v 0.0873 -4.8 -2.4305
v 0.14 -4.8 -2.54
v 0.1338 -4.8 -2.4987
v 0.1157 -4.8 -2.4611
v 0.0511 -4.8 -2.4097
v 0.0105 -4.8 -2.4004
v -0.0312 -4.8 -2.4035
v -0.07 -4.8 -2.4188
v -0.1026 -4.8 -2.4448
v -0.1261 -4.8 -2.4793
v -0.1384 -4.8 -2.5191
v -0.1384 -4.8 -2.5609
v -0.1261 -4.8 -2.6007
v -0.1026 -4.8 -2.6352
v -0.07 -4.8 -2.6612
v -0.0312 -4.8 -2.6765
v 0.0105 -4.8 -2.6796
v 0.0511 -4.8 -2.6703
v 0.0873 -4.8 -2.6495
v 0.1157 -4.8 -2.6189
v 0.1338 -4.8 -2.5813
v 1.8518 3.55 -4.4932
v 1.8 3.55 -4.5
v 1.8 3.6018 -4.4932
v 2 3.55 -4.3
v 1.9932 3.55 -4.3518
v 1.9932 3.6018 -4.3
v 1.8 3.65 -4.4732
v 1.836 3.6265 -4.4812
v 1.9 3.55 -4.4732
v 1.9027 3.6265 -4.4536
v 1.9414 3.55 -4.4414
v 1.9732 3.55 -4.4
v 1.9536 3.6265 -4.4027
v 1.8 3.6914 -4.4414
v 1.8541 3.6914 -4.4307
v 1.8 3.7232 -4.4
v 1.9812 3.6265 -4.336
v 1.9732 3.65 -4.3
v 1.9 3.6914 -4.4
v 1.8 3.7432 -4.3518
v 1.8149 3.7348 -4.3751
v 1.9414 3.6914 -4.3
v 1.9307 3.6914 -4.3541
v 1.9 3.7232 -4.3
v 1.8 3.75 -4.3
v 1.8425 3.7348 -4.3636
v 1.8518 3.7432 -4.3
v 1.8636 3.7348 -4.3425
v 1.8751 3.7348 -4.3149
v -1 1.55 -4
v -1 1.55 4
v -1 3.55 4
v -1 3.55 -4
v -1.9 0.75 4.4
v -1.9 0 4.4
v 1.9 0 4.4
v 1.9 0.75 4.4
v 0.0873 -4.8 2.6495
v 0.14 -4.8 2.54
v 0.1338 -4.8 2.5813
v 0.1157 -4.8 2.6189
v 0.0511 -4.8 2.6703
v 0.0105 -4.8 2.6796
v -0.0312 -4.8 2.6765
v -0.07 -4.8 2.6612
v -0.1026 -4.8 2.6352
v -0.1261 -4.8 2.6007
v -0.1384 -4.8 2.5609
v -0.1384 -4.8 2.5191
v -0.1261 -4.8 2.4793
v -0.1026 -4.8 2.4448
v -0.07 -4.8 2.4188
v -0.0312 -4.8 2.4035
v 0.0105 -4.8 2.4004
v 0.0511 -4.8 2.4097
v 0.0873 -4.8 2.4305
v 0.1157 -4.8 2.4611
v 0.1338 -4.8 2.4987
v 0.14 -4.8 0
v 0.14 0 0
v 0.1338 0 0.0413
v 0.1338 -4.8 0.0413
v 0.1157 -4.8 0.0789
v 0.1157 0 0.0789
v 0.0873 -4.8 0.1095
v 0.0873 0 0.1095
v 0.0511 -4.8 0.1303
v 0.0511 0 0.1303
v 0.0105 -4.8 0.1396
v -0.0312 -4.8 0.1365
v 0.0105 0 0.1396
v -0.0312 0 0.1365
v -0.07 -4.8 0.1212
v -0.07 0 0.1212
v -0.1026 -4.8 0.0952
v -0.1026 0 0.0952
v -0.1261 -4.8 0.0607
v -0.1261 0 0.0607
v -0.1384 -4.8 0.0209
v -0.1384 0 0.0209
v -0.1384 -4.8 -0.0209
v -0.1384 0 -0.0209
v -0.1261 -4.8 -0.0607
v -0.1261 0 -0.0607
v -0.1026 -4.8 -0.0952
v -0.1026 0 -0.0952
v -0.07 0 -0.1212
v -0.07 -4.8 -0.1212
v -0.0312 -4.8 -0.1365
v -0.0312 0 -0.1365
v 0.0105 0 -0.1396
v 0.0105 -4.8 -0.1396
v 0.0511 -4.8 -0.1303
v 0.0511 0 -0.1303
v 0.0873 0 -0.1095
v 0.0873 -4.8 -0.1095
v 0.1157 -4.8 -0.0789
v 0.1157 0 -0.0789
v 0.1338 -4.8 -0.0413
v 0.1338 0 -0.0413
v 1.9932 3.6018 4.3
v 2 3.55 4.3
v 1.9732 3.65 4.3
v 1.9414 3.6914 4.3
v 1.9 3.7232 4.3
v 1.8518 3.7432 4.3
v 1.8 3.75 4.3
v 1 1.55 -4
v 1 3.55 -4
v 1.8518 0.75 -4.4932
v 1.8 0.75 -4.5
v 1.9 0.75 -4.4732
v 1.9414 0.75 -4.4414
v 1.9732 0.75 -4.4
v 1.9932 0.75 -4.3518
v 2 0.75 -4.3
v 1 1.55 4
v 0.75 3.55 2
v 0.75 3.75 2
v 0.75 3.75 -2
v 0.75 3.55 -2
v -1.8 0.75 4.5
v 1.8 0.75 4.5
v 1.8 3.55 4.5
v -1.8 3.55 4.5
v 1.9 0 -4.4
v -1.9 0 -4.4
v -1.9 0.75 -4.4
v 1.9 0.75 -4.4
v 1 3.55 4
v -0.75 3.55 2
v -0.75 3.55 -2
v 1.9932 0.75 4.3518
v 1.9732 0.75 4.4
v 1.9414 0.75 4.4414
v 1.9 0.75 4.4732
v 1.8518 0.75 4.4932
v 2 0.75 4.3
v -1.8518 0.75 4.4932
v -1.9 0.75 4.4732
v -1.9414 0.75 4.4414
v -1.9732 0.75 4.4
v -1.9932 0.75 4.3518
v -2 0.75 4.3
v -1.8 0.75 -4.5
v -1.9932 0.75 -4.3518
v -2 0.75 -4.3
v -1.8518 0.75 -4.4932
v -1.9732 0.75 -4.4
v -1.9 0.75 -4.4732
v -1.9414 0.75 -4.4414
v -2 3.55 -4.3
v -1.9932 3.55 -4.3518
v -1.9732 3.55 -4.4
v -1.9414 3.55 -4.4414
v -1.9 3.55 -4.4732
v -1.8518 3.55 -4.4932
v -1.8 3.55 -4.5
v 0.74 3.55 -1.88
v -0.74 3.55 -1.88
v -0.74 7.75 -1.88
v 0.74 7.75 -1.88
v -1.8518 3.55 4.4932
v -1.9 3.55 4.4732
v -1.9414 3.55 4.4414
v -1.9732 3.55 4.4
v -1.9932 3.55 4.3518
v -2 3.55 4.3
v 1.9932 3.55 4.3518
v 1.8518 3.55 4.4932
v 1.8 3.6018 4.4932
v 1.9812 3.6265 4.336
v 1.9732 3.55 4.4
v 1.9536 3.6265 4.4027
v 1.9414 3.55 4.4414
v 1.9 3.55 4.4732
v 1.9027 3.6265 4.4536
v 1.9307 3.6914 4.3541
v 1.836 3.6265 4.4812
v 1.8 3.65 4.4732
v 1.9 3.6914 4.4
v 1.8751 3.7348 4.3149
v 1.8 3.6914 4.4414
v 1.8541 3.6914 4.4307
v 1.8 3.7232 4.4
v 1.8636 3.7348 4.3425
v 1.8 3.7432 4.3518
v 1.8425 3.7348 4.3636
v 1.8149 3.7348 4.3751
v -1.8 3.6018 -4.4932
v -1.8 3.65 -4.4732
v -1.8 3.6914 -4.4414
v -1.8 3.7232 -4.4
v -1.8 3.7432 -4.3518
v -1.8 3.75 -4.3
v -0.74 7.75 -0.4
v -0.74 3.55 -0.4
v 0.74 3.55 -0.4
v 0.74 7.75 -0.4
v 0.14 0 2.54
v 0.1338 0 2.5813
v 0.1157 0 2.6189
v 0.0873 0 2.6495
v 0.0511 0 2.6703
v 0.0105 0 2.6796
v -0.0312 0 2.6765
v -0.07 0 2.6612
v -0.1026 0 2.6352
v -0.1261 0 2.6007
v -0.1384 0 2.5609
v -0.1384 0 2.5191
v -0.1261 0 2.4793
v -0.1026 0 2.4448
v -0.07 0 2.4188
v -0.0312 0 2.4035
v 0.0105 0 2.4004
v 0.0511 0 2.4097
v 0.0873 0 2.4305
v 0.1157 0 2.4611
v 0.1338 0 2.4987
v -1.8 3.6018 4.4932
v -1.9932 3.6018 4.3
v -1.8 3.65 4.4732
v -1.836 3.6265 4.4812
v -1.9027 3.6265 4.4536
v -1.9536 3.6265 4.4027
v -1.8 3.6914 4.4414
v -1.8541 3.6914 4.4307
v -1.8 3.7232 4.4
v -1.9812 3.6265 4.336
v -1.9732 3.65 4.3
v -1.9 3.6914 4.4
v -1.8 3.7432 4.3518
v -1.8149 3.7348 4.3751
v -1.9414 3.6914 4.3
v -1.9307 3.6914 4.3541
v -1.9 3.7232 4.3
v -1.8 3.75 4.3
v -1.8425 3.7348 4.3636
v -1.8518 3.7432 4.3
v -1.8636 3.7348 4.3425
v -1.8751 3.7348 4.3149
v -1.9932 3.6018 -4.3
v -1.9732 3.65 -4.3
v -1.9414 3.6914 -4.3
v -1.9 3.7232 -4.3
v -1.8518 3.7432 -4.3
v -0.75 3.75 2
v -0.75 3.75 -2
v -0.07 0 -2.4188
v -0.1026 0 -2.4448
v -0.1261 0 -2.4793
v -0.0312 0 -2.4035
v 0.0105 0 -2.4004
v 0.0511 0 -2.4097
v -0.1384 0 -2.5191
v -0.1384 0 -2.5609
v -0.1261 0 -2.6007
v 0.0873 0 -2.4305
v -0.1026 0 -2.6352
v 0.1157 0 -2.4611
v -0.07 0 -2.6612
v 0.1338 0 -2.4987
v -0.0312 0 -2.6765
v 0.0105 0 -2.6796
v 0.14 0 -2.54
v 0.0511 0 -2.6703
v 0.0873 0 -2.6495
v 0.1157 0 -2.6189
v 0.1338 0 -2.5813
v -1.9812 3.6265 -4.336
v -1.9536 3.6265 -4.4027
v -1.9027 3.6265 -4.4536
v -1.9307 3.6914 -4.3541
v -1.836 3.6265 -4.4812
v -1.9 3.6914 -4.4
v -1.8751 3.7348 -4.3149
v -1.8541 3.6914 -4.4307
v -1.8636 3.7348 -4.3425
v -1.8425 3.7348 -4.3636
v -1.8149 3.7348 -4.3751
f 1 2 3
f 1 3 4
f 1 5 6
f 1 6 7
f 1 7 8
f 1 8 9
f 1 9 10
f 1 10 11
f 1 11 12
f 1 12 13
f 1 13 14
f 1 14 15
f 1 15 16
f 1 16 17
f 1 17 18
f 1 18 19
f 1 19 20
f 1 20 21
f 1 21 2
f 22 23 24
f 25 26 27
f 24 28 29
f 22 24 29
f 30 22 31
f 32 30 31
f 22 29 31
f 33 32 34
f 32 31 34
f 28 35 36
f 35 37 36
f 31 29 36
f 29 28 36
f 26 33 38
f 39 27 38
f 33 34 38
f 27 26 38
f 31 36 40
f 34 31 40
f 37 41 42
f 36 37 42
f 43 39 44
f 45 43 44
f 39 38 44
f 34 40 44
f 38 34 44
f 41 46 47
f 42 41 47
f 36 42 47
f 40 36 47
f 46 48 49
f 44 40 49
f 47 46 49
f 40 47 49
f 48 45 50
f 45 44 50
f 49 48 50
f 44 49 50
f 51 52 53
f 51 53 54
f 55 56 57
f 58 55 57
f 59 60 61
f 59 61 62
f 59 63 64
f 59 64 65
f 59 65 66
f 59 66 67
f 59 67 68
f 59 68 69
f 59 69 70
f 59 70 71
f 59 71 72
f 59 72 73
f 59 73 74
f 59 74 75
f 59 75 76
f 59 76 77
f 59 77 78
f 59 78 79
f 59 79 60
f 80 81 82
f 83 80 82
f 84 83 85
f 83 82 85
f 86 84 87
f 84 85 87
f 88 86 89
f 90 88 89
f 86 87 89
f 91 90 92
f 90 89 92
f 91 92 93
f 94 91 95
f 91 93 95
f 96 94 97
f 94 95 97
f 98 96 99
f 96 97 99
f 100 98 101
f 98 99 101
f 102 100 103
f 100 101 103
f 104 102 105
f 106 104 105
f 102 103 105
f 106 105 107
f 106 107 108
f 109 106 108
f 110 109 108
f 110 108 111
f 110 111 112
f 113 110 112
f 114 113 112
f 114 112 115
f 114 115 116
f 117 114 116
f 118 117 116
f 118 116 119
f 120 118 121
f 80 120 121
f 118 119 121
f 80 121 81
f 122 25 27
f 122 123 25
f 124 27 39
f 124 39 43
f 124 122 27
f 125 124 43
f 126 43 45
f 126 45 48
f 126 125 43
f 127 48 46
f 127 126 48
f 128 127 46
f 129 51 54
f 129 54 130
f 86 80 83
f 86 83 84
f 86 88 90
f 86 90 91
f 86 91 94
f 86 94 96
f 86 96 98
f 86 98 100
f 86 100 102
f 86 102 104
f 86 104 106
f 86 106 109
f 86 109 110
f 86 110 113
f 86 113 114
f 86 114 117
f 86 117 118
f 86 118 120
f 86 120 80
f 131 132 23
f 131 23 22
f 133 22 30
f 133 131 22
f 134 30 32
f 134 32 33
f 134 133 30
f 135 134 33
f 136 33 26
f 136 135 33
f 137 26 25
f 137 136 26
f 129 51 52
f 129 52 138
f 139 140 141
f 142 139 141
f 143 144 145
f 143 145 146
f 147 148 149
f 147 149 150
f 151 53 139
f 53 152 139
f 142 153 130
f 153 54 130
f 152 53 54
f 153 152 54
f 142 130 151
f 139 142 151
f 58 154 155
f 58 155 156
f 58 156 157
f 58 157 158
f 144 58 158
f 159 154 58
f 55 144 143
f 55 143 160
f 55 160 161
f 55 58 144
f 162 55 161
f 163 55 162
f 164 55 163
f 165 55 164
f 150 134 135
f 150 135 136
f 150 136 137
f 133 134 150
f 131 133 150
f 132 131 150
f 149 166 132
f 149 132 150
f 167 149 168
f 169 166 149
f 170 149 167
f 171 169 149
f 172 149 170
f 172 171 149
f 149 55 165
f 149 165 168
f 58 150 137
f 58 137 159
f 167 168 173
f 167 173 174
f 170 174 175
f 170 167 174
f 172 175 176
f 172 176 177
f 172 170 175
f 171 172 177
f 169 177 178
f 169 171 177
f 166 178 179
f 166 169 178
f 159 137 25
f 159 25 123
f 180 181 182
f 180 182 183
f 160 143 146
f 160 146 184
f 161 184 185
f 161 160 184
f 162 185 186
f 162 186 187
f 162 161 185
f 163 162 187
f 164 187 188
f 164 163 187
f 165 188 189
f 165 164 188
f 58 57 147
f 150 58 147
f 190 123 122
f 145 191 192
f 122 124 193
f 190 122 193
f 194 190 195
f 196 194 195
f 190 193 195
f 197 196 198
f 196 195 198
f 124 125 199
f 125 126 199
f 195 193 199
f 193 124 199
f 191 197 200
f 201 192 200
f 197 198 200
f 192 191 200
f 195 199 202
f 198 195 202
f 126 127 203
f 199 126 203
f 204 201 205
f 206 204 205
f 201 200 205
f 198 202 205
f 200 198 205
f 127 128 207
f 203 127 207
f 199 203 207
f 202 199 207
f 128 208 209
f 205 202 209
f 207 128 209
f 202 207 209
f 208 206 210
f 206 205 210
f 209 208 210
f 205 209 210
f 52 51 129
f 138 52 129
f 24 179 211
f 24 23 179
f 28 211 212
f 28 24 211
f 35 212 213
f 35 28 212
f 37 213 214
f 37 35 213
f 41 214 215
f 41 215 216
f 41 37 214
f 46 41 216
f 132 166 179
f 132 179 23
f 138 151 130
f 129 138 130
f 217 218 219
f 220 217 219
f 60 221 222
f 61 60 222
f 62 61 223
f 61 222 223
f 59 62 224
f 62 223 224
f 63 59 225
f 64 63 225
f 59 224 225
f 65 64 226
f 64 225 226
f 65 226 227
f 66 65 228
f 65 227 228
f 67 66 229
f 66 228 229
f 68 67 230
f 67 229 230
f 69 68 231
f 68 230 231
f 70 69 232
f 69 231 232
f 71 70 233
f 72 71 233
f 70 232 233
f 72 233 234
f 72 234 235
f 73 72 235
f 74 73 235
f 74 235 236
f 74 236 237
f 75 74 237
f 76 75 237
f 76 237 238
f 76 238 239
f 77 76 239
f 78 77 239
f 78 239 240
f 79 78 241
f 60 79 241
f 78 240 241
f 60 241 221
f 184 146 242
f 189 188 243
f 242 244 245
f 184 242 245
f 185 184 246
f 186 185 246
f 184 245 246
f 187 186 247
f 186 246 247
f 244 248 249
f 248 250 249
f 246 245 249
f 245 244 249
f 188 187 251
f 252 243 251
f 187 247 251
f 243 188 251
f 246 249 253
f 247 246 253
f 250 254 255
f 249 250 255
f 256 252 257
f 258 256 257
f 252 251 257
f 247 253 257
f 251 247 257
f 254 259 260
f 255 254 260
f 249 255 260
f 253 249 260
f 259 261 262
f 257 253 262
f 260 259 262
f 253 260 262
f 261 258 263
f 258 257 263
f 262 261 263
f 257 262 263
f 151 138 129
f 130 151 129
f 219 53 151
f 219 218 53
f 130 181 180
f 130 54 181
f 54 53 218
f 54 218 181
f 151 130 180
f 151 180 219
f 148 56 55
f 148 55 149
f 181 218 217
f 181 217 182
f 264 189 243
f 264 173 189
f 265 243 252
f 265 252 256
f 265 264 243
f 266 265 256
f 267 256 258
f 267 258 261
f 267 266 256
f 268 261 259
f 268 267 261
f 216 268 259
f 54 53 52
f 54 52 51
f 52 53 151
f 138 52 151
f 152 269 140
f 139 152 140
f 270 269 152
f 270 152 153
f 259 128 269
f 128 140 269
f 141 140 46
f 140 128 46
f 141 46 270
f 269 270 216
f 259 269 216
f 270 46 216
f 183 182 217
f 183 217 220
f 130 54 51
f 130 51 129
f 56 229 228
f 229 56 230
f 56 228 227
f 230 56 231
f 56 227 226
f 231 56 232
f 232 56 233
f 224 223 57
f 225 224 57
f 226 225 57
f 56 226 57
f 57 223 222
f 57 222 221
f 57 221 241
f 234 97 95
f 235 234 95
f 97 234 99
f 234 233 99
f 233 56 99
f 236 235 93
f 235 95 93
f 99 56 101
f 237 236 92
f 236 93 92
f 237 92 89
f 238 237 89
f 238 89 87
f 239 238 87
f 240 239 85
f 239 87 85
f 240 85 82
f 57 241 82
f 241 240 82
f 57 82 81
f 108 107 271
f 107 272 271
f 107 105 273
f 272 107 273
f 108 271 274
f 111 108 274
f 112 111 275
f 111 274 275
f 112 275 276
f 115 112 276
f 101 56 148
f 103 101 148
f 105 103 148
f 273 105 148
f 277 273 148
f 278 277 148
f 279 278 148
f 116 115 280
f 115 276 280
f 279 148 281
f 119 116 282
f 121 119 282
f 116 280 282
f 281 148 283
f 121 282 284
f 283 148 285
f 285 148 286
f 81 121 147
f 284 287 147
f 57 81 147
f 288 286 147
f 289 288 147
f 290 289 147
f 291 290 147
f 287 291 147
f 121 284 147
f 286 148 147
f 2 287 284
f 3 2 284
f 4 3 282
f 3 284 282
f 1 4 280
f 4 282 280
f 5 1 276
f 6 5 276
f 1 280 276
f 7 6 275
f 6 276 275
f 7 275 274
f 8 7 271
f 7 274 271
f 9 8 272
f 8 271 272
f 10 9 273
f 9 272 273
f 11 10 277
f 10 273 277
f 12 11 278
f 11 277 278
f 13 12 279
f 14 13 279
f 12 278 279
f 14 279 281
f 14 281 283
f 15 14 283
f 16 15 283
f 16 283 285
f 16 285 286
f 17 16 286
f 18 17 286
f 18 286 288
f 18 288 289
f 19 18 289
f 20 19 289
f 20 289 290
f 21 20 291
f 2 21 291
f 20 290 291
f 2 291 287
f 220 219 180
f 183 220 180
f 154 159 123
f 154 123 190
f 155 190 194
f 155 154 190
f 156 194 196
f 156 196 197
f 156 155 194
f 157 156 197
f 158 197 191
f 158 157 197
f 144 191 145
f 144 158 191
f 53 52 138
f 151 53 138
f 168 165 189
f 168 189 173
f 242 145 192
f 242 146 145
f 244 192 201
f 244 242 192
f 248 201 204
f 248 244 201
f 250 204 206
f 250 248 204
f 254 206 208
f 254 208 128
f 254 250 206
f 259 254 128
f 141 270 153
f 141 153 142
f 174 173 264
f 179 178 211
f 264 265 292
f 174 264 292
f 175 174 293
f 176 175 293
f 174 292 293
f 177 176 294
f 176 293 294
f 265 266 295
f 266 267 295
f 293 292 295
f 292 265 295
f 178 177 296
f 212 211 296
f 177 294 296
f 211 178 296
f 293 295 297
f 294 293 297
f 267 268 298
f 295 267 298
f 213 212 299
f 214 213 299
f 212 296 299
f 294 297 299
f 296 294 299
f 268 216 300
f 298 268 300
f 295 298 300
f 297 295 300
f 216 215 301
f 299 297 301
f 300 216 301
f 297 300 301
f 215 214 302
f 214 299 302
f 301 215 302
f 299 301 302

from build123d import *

# Parameters (mm, degrees)
SKETCH1_W               = 3.8
SKETCH1_H               = 8.8
BOSS_EXTRUDE1_DEPTH     = 0.75
BOSS_EXTRUDE2_DEPTH     = 3
SKETCH3_W               = 1.5
SKETCH3_H               = 4
CUT_EXTRUDE1_DEPTH      = 0.2
FILLET1_R               = 0.2
SKETCH4_W               = 2
SKETCH4_H               = 8
CUT_EXTRUDE2_DEPTH      = 2
SKETCH5_R               = 0.14
BOSS_EXTRUDE3_DEPTH     = 4.8
SKETCH6_W               = 1.48
SKETCH6_H               = 1.48
SWITCH_ON_AND_OFF_DEPTH = 6.2
SKETCH7_W               = 2
SKETCH7_H               = 8
BOSS_EXTRUDE5_DEPTH     = 2


with BuildPart() as part:
    # Sketch1 → Boss-Extrude1 (new body)
    with BuildSketch(Plane(origin=(0, 0, 0), x_dir=(1, 0, 0), z_dir=(0, 1, 0))):
        Rectangle(SKETCH1_W, SKETCH1_H)
    extrude(amount=BOSS_EXTRUDE1_DEPTH)

    # Sketch2 → Boss-Extrude2 (add)
    with BuildSketch(Plane(origin=(0, 0.75, 0), x_dir=(1, 0, 0), z_dir=(0, 1, 0))):
        with BuildLine():
            Line((-1.8, 4.5), (1.8, 4.5))
            ThreePointArc((1.8, 4.5), (1.941421356, 4.441421356), (2, 4.3))
            Line((2, 4.3), (2, -4.3))
            ThreePointArc((2, -4.3), (1.941421356, -4.441421356), (1.8, -4.5))
            Line((1.8, -4.5), (-1.8, -4.5))
            ThreePointArc((-1.8, -4.5), (-1.941421356, -4.441421356), (-2, -4.3))
            Line((-2, -4.3), (-2, 4.3))
            ThreePointArc((-2, 4.3), (-1.941421356, 4.441421356), (-1.8, 4.5))
        make_face()
    extrude(amount=BOSS_EXTRUDE2_DEPTH)

    # Sketch3 → Cut-Extrude1 (cut)
    with BuildSketch(Plane(origin=(0, 3.75, 0), x_dir=(1, 0, 0), z_dir=(0, 1, 0))):
        Rectangle(SKETCH3_W, SKETCH3_H)
    extrude(amount=-CUT_EXTRUDE1_DEPTH, mode=Mode.SUBTRACT)

    # Fillet1
    fillet1_edges = [part.edges().sort_by_distance(p)[0] for p in [
        (-1.941421356, 3.75, -4.441421356),
        (-2, 3.75, 0),
        (-1.941421356, 3.75, 4.441421356),
        (0, 3.75, 4.5),
        (1.941421356, 3.75, 4.441421356),
        (2, 3.75, 0),
        (1.941421356, 3.75, -4.441421356),
        (0, 3.75, -4.5),
    ]]
    fillet(fillet1_edges, radius=FILLET1_R)

    # Sketch4 → Cut-Extrude2 (cut)
    with BuildSketch(Plane(origin=(0, 3.55, 0), x_dir=(1, 0, 0), z_dir=(0, 1, 0))):
        Rectangle(SKETCH4_W, SKETCH4_H)
    extrude(amount=-CUT_EXTRUDE2_DEPTH, mode=Mode.SUBTRACT)

    # Sketch5 → Boss-Extrude3 (add)
    with BuildSketch(Plane.XZ):
        with Locations((0, 2.54)):
            Circle(SKETCH5_R)
        Circle(SKETCH5_R)
        with Locations((0, -2.54)):
            Circle(SKETCH5_R)
    extrude(amount=BOSS_EXTRUDE3_DEPTH)


with BuildPart() as body_2:
    # Sketch6 → Switch ON and OFF (new body)
    with BuildSketch(Plane(origin=(0, 1.55, 0), x_dir=(1, 0, 0), z_dir=(0, 1, 0))):
        with Locations((0, 1.14)):
            Rectangle(SKETCH6_W, SKETCH6_H)
    extrude(amount=SWITCH_ON_AND_OFF_DEPTH)

    # Sketch7 → Boss-Extrude5 (add)
    with BuildSketch(Plane(origin=(0, 1.55, 0), x_dir=(1, 0, 0), z_dir=(0, 1, 0))):
        Rectangle(SKETCH7_W, SKETCH7_H)
    extrude(amount=BOSS_EXTRUDE5_DEPTH)


solid = Compound([part.part, body_2.part])
